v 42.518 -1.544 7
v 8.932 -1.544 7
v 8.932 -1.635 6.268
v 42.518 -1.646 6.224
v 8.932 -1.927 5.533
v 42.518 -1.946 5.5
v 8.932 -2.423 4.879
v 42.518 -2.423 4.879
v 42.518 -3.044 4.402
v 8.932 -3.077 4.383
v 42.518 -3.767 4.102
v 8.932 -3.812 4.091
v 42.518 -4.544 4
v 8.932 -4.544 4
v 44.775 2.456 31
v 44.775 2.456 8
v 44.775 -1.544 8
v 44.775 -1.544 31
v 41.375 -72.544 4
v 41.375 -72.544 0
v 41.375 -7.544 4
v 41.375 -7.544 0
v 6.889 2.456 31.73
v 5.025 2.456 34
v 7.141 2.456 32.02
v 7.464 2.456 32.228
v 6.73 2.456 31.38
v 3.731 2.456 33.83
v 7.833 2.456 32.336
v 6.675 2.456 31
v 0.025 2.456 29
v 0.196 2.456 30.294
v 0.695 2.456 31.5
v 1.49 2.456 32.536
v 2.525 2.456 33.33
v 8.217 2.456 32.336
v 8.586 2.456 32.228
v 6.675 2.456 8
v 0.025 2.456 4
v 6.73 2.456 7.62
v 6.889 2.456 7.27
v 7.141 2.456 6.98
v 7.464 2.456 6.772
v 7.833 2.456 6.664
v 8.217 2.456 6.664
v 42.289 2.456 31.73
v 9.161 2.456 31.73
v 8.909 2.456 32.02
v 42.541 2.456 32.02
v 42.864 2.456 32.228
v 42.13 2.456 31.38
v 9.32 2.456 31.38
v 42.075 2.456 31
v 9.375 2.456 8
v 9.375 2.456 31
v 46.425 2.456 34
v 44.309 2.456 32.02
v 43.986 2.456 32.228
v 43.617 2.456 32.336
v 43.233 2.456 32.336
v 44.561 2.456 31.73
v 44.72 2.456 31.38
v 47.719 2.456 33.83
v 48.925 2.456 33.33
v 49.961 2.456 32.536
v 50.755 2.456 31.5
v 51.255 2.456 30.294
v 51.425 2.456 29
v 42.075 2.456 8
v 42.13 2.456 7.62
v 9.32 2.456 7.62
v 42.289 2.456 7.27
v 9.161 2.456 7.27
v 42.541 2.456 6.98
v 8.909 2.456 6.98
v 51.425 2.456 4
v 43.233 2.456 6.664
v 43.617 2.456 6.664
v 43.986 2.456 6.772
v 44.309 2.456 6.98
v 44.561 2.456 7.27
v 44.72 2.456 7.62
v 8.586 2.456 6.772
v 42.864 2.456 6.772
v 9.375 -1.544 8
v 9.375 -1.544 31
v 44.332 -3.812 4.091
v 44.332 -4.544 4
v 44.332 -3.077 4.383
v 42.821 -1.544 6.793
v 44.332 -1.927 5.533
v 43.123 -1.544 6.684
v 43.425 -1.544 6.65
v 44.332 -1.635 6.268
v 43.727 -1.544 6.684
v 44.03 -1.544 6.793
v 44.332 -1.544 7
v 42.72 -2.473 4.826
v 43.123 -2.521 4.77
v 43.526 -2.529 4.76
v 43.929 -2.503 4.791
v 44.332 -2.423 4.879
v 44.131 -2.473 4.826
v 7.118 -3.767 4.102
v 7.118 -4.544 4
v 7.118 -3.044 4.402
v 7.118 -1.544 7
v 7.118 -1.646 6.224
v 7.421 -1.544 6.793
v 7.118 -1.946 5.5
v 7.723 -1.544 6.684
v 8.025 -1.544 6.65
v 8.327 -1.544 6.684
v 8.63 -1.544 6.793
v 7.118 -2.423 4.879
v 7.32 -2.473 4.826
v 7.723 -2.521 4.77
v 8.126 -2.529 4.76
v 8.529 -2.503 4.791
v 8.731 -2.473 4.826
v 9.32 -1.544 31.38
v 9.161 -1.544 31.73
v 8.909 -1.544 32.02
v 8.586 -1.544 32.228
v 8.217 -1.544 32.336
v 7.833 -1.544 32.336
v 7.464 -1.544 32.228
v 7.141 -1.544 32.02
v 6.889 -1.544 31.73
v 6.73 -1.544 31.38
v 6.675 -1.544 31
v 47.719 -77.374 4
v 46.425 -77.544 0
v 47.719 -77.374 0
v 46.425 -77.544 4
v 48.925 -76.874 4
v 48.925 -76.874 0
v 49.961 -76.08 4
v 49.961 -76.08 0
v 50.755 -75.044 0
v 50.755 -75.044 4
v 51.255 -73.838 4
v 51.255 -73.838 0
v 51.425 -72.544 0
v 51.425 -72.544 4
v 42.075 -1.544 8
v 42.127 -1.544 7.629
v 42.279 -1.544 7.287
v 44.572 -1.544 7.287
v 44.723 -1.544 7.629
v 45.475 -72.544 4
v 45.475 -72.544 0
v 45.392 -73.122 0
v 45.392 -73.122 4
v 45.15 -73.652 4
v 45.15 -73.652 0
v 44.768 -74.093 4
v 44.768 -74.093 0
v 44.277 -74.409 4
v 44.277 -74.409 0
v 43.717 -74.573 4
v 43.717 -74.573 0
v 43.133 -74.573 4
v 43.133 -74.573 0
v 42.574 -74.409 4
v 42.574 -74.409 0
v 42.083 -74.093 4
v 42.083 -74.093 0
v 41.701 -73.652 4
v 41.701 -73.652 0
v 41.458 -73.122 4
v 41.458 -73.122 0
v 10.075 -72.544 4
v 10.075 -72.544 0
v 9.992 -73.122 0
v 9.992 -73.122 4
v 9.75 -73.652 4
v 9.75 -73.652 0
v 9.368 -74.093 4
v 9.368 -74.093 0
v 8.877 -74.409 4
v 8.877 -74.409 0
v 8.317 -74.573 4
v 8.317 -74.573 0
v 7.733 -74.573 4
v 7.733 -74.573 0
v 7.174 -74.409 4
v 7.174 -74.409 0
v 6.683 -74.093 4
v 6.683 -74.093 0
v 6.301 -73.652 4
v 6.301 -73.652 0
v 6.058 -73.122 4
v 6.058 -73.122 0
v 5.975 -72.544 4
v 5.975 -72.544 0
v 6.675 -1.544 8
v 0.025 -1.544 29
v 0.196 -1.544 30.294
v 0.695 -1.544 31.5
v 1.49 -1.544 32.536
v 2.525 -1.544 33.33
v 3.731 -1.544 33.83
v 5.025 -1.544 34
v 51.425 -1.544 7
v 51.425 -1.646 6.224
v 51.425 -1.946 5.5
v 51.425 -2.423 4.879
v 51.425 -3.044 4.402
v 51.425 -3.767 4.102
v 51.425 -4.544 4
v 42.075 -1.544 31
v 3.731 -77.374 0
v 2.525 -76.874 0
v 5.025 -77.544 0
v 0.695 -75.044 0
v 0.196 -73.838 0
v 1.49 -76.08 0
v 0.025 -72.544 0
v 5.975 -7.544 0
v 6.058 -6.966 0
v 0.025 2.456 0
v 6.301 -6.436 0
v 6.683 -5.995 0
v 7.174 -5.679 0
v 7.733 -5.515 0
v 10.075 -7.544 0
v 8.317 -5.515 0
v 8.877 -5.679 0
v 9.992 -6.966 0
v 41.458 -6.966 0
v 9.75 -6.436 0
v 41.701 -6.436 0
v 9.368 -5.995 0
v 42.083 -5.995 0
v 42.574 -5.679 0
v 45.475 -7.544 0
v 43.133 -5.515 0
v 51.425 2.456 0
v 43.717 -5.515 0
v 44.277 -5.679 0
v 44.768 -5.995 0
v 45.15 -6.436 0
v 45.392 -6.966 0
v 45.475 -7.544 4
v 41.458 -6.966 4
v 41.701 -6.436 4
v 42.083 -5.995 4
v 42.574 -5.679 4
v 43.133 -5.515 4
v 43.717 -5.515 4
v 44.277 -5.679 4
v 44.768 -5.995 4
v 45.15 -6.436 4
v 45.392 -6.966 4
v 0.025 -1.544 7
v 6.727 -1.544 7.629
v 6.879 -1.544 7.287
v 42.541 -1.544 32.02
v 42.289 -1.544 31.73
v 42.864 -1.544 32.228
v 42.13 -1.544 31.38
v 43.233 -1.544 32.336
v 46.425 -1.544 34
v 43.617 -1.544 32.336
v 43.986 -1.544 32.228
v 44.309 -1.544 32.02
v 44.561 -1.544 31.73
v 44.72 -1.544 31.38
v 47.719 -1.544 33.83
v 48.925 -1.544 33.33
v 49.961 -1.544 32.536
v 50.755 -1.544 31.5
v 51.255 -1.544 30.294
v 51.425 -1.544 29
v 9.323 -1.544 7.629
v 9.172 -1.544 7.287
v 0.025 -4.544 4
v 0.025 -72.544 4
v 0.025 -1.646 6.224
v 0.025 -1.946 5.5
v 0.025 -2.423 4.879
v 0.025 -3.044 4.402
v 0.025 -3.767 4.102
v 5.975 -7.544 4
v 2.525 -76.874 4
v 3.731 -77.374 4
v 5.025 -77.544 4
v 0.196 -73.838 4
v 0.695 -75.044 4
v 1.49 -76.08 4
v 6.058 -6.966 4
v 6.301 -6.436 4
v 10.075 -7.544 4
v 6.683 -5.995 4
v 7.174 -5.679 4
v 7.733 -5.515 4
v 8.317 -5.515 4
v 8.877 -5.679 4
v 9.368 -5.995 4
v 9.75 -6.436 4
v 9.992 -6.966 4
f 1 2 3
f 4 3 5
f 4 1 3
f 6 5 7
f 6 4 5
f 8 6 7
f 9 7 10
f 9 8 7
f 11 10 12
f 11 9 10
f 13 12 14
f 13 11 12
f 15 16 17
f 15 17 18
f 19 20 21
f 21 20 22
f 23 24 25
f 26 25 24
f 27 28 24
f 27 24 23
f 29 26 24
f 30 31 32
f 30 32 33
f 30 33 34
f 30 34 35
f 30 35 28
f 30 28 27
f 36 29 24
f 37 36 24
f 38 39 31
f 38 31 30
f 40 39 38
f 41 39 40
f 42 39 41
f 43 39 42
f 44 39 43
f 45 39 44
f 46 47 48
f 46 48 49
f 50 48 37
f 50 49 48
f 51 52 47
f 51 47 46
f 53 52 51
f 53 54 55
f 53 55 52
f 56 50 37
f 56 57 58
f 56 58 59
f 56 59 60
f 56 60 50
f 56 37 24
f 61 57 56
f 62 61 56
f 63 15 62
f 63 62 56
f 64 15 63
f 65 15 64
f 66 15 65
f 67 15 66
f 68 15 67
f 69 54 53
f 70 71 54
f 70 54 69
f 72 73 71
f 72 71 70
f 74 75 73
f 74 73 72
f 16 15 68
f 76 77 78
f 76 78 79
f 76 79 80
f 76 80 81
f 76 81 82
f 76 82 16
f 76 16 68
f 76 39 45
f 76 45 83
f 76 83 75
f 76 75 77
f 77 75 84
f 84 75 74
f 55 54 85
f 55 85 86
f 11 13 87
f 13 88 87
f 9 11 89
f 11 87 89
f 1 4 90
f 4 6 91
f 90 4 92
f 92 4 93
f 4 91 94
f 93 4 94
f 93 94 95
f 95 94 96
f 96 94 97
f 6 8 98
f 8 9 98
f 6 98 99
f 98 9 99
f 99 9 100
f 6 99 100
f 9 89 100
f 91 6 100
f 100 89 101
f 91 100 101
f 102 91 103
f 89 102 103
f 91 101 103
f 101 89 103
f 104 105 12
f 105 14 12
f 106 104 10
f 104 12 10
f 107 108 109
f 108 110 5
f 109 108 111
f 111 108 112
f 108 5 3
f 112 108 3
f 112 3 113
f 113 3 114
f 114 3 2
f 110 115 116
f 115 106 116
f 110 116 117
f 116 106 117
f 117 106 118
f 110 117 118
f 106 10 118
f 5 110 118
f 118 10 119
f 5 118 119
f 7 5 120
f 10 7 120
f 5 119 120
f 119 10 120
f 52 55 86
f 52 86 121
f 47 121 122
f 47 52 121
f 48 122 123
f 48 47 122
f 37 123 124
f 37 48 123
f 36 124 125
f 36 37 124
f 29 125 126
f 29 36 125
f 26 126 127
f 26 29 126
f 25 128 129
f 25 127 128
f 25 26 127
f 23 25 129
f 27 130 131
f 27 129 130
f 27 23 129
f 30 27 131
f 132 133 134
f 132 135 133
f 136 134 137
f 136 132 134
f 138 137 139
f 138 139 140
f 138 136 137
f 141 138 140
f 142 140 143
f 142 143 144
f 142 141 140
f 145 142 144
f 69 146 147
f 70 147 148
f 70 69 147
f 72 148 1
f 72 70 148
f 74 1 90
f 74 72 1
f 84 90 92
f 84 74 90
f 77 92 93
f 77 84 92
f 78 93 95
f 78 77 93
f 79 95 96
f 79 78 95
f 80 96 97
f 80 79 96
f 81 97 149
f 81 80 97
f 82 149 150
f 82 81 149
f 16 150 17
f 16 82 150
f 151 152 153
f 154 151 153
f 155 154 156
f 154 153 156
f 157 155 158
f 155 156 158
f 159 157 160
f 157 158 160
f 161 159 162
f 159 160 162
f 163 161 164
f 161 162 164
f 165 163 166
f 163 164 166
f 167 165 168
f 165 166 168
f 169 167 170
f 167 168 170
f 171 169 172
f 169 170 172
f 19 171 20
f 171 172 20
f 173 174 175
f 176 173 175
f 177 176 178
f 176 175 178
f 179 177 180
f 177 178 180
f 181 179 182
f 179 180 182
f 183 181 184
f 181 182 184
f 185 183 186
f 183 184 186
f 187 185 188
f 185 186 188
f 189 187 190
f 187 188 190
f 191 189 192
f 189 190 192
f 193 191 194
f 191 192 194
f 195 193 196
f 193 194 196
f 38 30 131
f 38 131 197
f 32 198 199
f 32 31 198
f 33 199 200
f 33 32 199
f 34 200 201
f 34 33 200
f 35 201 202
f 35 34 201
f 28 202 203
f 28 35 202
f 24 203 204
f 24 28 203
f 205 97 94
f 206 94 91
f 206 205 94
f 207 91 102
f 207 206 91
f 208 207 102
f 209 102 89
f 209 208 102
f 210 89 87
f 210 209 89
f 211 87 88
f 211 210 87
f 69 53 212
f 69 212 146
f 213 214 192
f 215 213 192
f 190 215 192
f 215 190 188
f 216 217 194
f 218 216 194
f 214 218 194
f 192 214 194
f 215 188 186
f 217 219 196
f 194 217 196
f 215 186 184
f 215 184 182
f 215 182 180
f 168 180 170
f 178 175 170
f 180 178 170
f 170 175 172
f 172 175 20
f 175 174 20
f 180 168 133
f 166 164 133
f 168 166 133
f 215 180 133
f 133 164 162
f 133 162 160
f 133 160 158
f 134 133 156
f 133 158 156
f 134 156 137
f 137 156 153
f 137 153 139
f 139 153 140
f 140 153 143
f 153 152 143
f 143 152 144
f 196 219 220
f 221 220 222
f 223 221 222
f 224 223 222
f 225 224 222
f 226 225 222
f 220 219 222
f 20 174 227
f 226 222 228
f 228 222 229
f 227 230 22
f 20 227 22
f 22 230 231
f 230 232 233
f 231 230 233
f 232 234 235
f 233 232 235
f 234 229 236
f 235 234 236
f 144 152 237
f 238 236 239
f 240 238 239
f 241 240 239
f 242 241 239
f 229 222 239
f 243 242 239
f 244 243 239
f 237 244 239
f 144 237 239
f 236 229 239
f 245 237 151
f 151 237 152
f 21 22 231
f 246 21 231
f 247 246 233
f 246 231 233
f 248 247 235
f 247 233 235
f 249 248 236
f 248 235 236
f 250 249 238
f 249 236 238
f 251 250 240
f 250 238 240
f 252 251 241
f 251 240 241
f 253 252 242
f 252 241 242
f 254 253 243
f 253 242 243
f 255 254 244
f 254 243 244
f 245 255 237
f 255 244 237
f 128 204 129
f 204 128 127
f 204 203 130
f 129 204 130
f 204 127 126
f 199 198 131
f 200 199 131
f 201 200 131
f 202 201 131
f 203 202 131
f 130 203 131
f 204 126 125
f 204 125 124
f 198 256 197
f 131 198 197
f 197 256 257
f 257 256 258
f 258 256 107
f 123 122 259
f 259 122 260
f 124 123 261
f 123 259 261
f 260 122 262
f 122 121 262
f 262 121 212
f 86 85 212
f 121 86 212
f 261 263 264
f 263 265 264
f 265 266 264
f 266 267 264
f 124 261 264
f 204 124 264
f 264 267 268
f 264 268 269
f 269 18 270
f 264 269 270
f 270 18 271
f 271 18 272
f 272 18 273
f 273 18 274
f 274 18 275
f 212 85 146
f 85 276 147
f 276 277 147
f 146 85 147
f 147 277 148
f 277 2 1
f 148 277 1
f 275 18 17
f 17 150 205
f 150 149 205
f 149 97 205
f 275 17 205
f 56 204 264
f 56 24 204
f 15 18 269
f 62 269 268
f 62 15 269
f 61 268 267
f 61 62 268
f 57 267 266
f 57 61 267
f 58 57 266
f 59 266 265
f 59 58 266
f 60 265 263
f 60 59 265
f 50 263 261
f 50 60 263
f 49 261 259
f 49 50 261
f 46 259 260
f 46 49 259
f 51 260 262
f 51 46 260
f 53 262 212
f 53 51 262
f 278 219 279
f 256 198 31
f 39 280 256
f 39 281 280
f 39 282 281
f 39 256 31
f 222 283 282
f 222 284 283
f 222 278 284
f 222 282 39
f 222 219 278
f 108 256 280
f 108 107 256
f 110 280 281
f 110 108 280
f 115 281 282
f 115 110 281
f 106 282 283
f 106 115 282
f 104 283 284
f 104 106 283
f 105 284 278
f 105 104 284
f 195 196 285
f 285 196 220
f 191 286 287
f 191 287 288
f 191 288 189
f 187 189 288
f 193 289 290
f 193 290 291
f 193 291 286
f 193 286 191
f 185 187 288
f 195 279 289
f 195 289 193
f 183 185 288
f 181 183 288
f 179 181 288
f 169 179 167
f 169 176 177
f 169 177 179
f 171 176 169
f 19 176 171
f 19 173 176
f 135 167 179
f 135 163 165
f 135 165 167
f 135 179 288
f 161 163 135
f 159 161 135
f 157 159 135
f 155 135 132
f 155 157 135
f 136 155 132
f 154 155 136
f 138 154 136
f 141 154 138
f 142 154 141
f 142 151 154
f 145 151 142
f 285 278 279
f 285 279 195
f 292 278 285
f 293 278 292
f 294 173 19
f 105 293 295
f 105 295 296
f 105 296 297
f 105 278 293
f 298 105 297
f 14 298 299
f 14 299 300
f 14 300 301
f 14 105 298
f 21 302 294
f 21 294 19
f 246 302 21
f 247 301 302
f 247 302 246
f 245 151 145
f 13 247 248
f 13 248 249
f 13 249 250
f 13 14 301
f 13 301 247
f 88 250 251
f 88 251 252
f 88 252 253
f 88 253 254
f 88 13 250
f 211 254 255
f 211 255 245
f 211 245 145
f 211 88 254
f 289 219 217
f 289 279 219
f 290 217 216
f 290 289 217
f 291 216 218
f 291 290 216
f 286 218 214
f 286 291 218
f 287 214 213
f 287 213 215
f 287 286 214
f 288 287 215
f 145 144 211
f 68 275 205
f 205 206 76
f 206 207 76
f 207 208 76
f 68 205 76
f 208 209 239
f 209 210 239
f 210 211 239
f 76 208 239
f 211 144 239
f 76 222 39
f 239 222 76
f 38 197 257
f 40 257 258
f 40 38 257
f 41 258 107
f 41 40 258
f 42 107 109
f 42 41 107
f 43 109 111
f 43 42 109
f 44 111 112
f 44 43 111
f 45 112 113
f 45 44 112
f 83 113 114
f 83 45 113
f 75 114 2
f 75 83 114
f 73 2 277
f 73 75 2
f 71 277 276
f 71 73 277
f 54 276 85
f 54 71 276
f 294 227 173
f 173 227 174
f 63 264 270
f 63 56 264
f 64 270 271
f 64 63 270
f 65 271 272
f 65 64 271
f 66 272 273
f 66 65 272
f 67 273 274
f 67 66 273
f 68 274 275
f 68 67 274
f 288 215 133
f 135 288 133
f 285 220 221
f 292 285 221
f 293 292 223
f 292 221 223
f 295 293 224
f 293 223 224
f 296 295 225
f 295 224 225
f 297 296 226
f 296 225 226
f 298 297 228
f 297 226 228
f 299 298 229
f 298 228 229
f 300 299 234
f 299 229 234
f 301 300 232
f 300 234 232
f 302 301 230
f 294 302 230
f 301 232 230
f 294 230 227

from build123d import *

# Parameters (mm, degrees)
SKETCH2_W           = 51.4
SKETCH2_H           = 80
BOSS_EXTRUDE1_DEPTH = 4
SKETCH3_W           = 51.4
SKETCH3_H           = 4
BOSS_EXTRUDE2_DEPTH = 30
CUT_EXTRUDE1_DEPTH  = 101.997894739
FILLET1_R           = 5
FILLET2_R           = 3


with BuildPart() as part:
    # Sketch2 → Boss-Extrude1 (new body)
    with BuildSketch(Plane.XY):
        with Locations((25.725149861, -37.544031409)):
            Rectangle(SKETCH2_W, SKETCH2_H)
        with BuildLine():
            Line((10.075149861, -7.544031409), (10.075149861, -72.544031409))
            ThreePointArc((10.075149861, -72.544031409), (8.025149861, -74.594031409), (5.975149861, -72.544031409))
            Line((5.975149861, -72.544031409), (5.975149861, -7.544031409))
            ThreePointArc((5.975149861, -7.544031409), (8.025149861, -5.494031409), (10.075149861, -7.544031409))
        make_face(mode=Mode.SUBTRACT)
        with BuildLine():
            Line((41.375149861, -72.544031409), (41.375149861, -7.544031409))
            ThreePointArc((41.375149861, -7.544031409), (43.425149861, -5.494031409), (45.475149861, -7.544031409))
            Line((45.475149861, -7.544031409), (45.475149861, -72.544031409))
            ThreePointArc((45.475149861, -72.544031409), (43.425149861, -74.594031409), (41.375149861, -72.544031409))
        make_face(mode=Mode.SUBTRACT)
    extrude(amount=BOSS_EXTRUDE1_DEPTH)

    # Sketch3 → Boss-Extrude2 (add)
    with BuildSketch(Plane.XY.offset(4)):
        with Locations((25.725149861, 0.456147987)):
            Rectangle(SKETCH3_W, SKETCH3_H)
    extrude(amount=BOSS_EXTRUDE2_DEPTH)

    # Sketch4 → Cut-Extrude1 (cut, through all)
    with BuildSketch(Plane(origin=(0, 2.456147987, 0), x_dir=(1, 0, 0), z_dir=(0, 1, 0))):
        with BuildLine():
            Line((9.375149861, -8), (9.375149861, -31))
            ThreePointArc((9.375149861, -31), (8.025149861, -32.35), (6.675149861, -31))
            Line((6.675149861, -31), (6.675149861, -8))
            ThreePointArc((6.675149861, -8), (8.025149861, -6.65), (9.375149861, -8))
        make_face()
        with BuildLine():
            Line((42.075149861, -31), (42.075149861, -8))
            ThreePointArc((42.075149861, -8), (43.425149861, -6.65), (44.775149861, -8))
            Line((44.775149861, -8), (44.775149861, -31))
            ThreePointArc((44.775149861, -31), (43.425149861, -32.35), (42.075149861, -31))
        make_face()
    extrude(amount=-CUT_EXTRUDE1_DEPTH, mode=Mode.SUBTRACT)

    # Fillet1
    fillet1_edges = [part.edges().sort_by_distance(p)[0] for p in [
        (0.025149861, 0.456147987, 34),
        (51.425149861, 0.456147987, 34),
        (51.425149861, -77.544031409, 2),
        (0.025149861, -77.544031409, 2),
    ]]
    fillet(fillet1_edges, radius=FILLET1_R)

    # Fillet2
    fillet2_edges = [part.edges().sort_by_distance(p)[0] for p in [
        (25.725149861, -1.543852013, 4),
    ]]
    fillet(fillet2_edges, radius=FILLET2_R)


solid = part.part
